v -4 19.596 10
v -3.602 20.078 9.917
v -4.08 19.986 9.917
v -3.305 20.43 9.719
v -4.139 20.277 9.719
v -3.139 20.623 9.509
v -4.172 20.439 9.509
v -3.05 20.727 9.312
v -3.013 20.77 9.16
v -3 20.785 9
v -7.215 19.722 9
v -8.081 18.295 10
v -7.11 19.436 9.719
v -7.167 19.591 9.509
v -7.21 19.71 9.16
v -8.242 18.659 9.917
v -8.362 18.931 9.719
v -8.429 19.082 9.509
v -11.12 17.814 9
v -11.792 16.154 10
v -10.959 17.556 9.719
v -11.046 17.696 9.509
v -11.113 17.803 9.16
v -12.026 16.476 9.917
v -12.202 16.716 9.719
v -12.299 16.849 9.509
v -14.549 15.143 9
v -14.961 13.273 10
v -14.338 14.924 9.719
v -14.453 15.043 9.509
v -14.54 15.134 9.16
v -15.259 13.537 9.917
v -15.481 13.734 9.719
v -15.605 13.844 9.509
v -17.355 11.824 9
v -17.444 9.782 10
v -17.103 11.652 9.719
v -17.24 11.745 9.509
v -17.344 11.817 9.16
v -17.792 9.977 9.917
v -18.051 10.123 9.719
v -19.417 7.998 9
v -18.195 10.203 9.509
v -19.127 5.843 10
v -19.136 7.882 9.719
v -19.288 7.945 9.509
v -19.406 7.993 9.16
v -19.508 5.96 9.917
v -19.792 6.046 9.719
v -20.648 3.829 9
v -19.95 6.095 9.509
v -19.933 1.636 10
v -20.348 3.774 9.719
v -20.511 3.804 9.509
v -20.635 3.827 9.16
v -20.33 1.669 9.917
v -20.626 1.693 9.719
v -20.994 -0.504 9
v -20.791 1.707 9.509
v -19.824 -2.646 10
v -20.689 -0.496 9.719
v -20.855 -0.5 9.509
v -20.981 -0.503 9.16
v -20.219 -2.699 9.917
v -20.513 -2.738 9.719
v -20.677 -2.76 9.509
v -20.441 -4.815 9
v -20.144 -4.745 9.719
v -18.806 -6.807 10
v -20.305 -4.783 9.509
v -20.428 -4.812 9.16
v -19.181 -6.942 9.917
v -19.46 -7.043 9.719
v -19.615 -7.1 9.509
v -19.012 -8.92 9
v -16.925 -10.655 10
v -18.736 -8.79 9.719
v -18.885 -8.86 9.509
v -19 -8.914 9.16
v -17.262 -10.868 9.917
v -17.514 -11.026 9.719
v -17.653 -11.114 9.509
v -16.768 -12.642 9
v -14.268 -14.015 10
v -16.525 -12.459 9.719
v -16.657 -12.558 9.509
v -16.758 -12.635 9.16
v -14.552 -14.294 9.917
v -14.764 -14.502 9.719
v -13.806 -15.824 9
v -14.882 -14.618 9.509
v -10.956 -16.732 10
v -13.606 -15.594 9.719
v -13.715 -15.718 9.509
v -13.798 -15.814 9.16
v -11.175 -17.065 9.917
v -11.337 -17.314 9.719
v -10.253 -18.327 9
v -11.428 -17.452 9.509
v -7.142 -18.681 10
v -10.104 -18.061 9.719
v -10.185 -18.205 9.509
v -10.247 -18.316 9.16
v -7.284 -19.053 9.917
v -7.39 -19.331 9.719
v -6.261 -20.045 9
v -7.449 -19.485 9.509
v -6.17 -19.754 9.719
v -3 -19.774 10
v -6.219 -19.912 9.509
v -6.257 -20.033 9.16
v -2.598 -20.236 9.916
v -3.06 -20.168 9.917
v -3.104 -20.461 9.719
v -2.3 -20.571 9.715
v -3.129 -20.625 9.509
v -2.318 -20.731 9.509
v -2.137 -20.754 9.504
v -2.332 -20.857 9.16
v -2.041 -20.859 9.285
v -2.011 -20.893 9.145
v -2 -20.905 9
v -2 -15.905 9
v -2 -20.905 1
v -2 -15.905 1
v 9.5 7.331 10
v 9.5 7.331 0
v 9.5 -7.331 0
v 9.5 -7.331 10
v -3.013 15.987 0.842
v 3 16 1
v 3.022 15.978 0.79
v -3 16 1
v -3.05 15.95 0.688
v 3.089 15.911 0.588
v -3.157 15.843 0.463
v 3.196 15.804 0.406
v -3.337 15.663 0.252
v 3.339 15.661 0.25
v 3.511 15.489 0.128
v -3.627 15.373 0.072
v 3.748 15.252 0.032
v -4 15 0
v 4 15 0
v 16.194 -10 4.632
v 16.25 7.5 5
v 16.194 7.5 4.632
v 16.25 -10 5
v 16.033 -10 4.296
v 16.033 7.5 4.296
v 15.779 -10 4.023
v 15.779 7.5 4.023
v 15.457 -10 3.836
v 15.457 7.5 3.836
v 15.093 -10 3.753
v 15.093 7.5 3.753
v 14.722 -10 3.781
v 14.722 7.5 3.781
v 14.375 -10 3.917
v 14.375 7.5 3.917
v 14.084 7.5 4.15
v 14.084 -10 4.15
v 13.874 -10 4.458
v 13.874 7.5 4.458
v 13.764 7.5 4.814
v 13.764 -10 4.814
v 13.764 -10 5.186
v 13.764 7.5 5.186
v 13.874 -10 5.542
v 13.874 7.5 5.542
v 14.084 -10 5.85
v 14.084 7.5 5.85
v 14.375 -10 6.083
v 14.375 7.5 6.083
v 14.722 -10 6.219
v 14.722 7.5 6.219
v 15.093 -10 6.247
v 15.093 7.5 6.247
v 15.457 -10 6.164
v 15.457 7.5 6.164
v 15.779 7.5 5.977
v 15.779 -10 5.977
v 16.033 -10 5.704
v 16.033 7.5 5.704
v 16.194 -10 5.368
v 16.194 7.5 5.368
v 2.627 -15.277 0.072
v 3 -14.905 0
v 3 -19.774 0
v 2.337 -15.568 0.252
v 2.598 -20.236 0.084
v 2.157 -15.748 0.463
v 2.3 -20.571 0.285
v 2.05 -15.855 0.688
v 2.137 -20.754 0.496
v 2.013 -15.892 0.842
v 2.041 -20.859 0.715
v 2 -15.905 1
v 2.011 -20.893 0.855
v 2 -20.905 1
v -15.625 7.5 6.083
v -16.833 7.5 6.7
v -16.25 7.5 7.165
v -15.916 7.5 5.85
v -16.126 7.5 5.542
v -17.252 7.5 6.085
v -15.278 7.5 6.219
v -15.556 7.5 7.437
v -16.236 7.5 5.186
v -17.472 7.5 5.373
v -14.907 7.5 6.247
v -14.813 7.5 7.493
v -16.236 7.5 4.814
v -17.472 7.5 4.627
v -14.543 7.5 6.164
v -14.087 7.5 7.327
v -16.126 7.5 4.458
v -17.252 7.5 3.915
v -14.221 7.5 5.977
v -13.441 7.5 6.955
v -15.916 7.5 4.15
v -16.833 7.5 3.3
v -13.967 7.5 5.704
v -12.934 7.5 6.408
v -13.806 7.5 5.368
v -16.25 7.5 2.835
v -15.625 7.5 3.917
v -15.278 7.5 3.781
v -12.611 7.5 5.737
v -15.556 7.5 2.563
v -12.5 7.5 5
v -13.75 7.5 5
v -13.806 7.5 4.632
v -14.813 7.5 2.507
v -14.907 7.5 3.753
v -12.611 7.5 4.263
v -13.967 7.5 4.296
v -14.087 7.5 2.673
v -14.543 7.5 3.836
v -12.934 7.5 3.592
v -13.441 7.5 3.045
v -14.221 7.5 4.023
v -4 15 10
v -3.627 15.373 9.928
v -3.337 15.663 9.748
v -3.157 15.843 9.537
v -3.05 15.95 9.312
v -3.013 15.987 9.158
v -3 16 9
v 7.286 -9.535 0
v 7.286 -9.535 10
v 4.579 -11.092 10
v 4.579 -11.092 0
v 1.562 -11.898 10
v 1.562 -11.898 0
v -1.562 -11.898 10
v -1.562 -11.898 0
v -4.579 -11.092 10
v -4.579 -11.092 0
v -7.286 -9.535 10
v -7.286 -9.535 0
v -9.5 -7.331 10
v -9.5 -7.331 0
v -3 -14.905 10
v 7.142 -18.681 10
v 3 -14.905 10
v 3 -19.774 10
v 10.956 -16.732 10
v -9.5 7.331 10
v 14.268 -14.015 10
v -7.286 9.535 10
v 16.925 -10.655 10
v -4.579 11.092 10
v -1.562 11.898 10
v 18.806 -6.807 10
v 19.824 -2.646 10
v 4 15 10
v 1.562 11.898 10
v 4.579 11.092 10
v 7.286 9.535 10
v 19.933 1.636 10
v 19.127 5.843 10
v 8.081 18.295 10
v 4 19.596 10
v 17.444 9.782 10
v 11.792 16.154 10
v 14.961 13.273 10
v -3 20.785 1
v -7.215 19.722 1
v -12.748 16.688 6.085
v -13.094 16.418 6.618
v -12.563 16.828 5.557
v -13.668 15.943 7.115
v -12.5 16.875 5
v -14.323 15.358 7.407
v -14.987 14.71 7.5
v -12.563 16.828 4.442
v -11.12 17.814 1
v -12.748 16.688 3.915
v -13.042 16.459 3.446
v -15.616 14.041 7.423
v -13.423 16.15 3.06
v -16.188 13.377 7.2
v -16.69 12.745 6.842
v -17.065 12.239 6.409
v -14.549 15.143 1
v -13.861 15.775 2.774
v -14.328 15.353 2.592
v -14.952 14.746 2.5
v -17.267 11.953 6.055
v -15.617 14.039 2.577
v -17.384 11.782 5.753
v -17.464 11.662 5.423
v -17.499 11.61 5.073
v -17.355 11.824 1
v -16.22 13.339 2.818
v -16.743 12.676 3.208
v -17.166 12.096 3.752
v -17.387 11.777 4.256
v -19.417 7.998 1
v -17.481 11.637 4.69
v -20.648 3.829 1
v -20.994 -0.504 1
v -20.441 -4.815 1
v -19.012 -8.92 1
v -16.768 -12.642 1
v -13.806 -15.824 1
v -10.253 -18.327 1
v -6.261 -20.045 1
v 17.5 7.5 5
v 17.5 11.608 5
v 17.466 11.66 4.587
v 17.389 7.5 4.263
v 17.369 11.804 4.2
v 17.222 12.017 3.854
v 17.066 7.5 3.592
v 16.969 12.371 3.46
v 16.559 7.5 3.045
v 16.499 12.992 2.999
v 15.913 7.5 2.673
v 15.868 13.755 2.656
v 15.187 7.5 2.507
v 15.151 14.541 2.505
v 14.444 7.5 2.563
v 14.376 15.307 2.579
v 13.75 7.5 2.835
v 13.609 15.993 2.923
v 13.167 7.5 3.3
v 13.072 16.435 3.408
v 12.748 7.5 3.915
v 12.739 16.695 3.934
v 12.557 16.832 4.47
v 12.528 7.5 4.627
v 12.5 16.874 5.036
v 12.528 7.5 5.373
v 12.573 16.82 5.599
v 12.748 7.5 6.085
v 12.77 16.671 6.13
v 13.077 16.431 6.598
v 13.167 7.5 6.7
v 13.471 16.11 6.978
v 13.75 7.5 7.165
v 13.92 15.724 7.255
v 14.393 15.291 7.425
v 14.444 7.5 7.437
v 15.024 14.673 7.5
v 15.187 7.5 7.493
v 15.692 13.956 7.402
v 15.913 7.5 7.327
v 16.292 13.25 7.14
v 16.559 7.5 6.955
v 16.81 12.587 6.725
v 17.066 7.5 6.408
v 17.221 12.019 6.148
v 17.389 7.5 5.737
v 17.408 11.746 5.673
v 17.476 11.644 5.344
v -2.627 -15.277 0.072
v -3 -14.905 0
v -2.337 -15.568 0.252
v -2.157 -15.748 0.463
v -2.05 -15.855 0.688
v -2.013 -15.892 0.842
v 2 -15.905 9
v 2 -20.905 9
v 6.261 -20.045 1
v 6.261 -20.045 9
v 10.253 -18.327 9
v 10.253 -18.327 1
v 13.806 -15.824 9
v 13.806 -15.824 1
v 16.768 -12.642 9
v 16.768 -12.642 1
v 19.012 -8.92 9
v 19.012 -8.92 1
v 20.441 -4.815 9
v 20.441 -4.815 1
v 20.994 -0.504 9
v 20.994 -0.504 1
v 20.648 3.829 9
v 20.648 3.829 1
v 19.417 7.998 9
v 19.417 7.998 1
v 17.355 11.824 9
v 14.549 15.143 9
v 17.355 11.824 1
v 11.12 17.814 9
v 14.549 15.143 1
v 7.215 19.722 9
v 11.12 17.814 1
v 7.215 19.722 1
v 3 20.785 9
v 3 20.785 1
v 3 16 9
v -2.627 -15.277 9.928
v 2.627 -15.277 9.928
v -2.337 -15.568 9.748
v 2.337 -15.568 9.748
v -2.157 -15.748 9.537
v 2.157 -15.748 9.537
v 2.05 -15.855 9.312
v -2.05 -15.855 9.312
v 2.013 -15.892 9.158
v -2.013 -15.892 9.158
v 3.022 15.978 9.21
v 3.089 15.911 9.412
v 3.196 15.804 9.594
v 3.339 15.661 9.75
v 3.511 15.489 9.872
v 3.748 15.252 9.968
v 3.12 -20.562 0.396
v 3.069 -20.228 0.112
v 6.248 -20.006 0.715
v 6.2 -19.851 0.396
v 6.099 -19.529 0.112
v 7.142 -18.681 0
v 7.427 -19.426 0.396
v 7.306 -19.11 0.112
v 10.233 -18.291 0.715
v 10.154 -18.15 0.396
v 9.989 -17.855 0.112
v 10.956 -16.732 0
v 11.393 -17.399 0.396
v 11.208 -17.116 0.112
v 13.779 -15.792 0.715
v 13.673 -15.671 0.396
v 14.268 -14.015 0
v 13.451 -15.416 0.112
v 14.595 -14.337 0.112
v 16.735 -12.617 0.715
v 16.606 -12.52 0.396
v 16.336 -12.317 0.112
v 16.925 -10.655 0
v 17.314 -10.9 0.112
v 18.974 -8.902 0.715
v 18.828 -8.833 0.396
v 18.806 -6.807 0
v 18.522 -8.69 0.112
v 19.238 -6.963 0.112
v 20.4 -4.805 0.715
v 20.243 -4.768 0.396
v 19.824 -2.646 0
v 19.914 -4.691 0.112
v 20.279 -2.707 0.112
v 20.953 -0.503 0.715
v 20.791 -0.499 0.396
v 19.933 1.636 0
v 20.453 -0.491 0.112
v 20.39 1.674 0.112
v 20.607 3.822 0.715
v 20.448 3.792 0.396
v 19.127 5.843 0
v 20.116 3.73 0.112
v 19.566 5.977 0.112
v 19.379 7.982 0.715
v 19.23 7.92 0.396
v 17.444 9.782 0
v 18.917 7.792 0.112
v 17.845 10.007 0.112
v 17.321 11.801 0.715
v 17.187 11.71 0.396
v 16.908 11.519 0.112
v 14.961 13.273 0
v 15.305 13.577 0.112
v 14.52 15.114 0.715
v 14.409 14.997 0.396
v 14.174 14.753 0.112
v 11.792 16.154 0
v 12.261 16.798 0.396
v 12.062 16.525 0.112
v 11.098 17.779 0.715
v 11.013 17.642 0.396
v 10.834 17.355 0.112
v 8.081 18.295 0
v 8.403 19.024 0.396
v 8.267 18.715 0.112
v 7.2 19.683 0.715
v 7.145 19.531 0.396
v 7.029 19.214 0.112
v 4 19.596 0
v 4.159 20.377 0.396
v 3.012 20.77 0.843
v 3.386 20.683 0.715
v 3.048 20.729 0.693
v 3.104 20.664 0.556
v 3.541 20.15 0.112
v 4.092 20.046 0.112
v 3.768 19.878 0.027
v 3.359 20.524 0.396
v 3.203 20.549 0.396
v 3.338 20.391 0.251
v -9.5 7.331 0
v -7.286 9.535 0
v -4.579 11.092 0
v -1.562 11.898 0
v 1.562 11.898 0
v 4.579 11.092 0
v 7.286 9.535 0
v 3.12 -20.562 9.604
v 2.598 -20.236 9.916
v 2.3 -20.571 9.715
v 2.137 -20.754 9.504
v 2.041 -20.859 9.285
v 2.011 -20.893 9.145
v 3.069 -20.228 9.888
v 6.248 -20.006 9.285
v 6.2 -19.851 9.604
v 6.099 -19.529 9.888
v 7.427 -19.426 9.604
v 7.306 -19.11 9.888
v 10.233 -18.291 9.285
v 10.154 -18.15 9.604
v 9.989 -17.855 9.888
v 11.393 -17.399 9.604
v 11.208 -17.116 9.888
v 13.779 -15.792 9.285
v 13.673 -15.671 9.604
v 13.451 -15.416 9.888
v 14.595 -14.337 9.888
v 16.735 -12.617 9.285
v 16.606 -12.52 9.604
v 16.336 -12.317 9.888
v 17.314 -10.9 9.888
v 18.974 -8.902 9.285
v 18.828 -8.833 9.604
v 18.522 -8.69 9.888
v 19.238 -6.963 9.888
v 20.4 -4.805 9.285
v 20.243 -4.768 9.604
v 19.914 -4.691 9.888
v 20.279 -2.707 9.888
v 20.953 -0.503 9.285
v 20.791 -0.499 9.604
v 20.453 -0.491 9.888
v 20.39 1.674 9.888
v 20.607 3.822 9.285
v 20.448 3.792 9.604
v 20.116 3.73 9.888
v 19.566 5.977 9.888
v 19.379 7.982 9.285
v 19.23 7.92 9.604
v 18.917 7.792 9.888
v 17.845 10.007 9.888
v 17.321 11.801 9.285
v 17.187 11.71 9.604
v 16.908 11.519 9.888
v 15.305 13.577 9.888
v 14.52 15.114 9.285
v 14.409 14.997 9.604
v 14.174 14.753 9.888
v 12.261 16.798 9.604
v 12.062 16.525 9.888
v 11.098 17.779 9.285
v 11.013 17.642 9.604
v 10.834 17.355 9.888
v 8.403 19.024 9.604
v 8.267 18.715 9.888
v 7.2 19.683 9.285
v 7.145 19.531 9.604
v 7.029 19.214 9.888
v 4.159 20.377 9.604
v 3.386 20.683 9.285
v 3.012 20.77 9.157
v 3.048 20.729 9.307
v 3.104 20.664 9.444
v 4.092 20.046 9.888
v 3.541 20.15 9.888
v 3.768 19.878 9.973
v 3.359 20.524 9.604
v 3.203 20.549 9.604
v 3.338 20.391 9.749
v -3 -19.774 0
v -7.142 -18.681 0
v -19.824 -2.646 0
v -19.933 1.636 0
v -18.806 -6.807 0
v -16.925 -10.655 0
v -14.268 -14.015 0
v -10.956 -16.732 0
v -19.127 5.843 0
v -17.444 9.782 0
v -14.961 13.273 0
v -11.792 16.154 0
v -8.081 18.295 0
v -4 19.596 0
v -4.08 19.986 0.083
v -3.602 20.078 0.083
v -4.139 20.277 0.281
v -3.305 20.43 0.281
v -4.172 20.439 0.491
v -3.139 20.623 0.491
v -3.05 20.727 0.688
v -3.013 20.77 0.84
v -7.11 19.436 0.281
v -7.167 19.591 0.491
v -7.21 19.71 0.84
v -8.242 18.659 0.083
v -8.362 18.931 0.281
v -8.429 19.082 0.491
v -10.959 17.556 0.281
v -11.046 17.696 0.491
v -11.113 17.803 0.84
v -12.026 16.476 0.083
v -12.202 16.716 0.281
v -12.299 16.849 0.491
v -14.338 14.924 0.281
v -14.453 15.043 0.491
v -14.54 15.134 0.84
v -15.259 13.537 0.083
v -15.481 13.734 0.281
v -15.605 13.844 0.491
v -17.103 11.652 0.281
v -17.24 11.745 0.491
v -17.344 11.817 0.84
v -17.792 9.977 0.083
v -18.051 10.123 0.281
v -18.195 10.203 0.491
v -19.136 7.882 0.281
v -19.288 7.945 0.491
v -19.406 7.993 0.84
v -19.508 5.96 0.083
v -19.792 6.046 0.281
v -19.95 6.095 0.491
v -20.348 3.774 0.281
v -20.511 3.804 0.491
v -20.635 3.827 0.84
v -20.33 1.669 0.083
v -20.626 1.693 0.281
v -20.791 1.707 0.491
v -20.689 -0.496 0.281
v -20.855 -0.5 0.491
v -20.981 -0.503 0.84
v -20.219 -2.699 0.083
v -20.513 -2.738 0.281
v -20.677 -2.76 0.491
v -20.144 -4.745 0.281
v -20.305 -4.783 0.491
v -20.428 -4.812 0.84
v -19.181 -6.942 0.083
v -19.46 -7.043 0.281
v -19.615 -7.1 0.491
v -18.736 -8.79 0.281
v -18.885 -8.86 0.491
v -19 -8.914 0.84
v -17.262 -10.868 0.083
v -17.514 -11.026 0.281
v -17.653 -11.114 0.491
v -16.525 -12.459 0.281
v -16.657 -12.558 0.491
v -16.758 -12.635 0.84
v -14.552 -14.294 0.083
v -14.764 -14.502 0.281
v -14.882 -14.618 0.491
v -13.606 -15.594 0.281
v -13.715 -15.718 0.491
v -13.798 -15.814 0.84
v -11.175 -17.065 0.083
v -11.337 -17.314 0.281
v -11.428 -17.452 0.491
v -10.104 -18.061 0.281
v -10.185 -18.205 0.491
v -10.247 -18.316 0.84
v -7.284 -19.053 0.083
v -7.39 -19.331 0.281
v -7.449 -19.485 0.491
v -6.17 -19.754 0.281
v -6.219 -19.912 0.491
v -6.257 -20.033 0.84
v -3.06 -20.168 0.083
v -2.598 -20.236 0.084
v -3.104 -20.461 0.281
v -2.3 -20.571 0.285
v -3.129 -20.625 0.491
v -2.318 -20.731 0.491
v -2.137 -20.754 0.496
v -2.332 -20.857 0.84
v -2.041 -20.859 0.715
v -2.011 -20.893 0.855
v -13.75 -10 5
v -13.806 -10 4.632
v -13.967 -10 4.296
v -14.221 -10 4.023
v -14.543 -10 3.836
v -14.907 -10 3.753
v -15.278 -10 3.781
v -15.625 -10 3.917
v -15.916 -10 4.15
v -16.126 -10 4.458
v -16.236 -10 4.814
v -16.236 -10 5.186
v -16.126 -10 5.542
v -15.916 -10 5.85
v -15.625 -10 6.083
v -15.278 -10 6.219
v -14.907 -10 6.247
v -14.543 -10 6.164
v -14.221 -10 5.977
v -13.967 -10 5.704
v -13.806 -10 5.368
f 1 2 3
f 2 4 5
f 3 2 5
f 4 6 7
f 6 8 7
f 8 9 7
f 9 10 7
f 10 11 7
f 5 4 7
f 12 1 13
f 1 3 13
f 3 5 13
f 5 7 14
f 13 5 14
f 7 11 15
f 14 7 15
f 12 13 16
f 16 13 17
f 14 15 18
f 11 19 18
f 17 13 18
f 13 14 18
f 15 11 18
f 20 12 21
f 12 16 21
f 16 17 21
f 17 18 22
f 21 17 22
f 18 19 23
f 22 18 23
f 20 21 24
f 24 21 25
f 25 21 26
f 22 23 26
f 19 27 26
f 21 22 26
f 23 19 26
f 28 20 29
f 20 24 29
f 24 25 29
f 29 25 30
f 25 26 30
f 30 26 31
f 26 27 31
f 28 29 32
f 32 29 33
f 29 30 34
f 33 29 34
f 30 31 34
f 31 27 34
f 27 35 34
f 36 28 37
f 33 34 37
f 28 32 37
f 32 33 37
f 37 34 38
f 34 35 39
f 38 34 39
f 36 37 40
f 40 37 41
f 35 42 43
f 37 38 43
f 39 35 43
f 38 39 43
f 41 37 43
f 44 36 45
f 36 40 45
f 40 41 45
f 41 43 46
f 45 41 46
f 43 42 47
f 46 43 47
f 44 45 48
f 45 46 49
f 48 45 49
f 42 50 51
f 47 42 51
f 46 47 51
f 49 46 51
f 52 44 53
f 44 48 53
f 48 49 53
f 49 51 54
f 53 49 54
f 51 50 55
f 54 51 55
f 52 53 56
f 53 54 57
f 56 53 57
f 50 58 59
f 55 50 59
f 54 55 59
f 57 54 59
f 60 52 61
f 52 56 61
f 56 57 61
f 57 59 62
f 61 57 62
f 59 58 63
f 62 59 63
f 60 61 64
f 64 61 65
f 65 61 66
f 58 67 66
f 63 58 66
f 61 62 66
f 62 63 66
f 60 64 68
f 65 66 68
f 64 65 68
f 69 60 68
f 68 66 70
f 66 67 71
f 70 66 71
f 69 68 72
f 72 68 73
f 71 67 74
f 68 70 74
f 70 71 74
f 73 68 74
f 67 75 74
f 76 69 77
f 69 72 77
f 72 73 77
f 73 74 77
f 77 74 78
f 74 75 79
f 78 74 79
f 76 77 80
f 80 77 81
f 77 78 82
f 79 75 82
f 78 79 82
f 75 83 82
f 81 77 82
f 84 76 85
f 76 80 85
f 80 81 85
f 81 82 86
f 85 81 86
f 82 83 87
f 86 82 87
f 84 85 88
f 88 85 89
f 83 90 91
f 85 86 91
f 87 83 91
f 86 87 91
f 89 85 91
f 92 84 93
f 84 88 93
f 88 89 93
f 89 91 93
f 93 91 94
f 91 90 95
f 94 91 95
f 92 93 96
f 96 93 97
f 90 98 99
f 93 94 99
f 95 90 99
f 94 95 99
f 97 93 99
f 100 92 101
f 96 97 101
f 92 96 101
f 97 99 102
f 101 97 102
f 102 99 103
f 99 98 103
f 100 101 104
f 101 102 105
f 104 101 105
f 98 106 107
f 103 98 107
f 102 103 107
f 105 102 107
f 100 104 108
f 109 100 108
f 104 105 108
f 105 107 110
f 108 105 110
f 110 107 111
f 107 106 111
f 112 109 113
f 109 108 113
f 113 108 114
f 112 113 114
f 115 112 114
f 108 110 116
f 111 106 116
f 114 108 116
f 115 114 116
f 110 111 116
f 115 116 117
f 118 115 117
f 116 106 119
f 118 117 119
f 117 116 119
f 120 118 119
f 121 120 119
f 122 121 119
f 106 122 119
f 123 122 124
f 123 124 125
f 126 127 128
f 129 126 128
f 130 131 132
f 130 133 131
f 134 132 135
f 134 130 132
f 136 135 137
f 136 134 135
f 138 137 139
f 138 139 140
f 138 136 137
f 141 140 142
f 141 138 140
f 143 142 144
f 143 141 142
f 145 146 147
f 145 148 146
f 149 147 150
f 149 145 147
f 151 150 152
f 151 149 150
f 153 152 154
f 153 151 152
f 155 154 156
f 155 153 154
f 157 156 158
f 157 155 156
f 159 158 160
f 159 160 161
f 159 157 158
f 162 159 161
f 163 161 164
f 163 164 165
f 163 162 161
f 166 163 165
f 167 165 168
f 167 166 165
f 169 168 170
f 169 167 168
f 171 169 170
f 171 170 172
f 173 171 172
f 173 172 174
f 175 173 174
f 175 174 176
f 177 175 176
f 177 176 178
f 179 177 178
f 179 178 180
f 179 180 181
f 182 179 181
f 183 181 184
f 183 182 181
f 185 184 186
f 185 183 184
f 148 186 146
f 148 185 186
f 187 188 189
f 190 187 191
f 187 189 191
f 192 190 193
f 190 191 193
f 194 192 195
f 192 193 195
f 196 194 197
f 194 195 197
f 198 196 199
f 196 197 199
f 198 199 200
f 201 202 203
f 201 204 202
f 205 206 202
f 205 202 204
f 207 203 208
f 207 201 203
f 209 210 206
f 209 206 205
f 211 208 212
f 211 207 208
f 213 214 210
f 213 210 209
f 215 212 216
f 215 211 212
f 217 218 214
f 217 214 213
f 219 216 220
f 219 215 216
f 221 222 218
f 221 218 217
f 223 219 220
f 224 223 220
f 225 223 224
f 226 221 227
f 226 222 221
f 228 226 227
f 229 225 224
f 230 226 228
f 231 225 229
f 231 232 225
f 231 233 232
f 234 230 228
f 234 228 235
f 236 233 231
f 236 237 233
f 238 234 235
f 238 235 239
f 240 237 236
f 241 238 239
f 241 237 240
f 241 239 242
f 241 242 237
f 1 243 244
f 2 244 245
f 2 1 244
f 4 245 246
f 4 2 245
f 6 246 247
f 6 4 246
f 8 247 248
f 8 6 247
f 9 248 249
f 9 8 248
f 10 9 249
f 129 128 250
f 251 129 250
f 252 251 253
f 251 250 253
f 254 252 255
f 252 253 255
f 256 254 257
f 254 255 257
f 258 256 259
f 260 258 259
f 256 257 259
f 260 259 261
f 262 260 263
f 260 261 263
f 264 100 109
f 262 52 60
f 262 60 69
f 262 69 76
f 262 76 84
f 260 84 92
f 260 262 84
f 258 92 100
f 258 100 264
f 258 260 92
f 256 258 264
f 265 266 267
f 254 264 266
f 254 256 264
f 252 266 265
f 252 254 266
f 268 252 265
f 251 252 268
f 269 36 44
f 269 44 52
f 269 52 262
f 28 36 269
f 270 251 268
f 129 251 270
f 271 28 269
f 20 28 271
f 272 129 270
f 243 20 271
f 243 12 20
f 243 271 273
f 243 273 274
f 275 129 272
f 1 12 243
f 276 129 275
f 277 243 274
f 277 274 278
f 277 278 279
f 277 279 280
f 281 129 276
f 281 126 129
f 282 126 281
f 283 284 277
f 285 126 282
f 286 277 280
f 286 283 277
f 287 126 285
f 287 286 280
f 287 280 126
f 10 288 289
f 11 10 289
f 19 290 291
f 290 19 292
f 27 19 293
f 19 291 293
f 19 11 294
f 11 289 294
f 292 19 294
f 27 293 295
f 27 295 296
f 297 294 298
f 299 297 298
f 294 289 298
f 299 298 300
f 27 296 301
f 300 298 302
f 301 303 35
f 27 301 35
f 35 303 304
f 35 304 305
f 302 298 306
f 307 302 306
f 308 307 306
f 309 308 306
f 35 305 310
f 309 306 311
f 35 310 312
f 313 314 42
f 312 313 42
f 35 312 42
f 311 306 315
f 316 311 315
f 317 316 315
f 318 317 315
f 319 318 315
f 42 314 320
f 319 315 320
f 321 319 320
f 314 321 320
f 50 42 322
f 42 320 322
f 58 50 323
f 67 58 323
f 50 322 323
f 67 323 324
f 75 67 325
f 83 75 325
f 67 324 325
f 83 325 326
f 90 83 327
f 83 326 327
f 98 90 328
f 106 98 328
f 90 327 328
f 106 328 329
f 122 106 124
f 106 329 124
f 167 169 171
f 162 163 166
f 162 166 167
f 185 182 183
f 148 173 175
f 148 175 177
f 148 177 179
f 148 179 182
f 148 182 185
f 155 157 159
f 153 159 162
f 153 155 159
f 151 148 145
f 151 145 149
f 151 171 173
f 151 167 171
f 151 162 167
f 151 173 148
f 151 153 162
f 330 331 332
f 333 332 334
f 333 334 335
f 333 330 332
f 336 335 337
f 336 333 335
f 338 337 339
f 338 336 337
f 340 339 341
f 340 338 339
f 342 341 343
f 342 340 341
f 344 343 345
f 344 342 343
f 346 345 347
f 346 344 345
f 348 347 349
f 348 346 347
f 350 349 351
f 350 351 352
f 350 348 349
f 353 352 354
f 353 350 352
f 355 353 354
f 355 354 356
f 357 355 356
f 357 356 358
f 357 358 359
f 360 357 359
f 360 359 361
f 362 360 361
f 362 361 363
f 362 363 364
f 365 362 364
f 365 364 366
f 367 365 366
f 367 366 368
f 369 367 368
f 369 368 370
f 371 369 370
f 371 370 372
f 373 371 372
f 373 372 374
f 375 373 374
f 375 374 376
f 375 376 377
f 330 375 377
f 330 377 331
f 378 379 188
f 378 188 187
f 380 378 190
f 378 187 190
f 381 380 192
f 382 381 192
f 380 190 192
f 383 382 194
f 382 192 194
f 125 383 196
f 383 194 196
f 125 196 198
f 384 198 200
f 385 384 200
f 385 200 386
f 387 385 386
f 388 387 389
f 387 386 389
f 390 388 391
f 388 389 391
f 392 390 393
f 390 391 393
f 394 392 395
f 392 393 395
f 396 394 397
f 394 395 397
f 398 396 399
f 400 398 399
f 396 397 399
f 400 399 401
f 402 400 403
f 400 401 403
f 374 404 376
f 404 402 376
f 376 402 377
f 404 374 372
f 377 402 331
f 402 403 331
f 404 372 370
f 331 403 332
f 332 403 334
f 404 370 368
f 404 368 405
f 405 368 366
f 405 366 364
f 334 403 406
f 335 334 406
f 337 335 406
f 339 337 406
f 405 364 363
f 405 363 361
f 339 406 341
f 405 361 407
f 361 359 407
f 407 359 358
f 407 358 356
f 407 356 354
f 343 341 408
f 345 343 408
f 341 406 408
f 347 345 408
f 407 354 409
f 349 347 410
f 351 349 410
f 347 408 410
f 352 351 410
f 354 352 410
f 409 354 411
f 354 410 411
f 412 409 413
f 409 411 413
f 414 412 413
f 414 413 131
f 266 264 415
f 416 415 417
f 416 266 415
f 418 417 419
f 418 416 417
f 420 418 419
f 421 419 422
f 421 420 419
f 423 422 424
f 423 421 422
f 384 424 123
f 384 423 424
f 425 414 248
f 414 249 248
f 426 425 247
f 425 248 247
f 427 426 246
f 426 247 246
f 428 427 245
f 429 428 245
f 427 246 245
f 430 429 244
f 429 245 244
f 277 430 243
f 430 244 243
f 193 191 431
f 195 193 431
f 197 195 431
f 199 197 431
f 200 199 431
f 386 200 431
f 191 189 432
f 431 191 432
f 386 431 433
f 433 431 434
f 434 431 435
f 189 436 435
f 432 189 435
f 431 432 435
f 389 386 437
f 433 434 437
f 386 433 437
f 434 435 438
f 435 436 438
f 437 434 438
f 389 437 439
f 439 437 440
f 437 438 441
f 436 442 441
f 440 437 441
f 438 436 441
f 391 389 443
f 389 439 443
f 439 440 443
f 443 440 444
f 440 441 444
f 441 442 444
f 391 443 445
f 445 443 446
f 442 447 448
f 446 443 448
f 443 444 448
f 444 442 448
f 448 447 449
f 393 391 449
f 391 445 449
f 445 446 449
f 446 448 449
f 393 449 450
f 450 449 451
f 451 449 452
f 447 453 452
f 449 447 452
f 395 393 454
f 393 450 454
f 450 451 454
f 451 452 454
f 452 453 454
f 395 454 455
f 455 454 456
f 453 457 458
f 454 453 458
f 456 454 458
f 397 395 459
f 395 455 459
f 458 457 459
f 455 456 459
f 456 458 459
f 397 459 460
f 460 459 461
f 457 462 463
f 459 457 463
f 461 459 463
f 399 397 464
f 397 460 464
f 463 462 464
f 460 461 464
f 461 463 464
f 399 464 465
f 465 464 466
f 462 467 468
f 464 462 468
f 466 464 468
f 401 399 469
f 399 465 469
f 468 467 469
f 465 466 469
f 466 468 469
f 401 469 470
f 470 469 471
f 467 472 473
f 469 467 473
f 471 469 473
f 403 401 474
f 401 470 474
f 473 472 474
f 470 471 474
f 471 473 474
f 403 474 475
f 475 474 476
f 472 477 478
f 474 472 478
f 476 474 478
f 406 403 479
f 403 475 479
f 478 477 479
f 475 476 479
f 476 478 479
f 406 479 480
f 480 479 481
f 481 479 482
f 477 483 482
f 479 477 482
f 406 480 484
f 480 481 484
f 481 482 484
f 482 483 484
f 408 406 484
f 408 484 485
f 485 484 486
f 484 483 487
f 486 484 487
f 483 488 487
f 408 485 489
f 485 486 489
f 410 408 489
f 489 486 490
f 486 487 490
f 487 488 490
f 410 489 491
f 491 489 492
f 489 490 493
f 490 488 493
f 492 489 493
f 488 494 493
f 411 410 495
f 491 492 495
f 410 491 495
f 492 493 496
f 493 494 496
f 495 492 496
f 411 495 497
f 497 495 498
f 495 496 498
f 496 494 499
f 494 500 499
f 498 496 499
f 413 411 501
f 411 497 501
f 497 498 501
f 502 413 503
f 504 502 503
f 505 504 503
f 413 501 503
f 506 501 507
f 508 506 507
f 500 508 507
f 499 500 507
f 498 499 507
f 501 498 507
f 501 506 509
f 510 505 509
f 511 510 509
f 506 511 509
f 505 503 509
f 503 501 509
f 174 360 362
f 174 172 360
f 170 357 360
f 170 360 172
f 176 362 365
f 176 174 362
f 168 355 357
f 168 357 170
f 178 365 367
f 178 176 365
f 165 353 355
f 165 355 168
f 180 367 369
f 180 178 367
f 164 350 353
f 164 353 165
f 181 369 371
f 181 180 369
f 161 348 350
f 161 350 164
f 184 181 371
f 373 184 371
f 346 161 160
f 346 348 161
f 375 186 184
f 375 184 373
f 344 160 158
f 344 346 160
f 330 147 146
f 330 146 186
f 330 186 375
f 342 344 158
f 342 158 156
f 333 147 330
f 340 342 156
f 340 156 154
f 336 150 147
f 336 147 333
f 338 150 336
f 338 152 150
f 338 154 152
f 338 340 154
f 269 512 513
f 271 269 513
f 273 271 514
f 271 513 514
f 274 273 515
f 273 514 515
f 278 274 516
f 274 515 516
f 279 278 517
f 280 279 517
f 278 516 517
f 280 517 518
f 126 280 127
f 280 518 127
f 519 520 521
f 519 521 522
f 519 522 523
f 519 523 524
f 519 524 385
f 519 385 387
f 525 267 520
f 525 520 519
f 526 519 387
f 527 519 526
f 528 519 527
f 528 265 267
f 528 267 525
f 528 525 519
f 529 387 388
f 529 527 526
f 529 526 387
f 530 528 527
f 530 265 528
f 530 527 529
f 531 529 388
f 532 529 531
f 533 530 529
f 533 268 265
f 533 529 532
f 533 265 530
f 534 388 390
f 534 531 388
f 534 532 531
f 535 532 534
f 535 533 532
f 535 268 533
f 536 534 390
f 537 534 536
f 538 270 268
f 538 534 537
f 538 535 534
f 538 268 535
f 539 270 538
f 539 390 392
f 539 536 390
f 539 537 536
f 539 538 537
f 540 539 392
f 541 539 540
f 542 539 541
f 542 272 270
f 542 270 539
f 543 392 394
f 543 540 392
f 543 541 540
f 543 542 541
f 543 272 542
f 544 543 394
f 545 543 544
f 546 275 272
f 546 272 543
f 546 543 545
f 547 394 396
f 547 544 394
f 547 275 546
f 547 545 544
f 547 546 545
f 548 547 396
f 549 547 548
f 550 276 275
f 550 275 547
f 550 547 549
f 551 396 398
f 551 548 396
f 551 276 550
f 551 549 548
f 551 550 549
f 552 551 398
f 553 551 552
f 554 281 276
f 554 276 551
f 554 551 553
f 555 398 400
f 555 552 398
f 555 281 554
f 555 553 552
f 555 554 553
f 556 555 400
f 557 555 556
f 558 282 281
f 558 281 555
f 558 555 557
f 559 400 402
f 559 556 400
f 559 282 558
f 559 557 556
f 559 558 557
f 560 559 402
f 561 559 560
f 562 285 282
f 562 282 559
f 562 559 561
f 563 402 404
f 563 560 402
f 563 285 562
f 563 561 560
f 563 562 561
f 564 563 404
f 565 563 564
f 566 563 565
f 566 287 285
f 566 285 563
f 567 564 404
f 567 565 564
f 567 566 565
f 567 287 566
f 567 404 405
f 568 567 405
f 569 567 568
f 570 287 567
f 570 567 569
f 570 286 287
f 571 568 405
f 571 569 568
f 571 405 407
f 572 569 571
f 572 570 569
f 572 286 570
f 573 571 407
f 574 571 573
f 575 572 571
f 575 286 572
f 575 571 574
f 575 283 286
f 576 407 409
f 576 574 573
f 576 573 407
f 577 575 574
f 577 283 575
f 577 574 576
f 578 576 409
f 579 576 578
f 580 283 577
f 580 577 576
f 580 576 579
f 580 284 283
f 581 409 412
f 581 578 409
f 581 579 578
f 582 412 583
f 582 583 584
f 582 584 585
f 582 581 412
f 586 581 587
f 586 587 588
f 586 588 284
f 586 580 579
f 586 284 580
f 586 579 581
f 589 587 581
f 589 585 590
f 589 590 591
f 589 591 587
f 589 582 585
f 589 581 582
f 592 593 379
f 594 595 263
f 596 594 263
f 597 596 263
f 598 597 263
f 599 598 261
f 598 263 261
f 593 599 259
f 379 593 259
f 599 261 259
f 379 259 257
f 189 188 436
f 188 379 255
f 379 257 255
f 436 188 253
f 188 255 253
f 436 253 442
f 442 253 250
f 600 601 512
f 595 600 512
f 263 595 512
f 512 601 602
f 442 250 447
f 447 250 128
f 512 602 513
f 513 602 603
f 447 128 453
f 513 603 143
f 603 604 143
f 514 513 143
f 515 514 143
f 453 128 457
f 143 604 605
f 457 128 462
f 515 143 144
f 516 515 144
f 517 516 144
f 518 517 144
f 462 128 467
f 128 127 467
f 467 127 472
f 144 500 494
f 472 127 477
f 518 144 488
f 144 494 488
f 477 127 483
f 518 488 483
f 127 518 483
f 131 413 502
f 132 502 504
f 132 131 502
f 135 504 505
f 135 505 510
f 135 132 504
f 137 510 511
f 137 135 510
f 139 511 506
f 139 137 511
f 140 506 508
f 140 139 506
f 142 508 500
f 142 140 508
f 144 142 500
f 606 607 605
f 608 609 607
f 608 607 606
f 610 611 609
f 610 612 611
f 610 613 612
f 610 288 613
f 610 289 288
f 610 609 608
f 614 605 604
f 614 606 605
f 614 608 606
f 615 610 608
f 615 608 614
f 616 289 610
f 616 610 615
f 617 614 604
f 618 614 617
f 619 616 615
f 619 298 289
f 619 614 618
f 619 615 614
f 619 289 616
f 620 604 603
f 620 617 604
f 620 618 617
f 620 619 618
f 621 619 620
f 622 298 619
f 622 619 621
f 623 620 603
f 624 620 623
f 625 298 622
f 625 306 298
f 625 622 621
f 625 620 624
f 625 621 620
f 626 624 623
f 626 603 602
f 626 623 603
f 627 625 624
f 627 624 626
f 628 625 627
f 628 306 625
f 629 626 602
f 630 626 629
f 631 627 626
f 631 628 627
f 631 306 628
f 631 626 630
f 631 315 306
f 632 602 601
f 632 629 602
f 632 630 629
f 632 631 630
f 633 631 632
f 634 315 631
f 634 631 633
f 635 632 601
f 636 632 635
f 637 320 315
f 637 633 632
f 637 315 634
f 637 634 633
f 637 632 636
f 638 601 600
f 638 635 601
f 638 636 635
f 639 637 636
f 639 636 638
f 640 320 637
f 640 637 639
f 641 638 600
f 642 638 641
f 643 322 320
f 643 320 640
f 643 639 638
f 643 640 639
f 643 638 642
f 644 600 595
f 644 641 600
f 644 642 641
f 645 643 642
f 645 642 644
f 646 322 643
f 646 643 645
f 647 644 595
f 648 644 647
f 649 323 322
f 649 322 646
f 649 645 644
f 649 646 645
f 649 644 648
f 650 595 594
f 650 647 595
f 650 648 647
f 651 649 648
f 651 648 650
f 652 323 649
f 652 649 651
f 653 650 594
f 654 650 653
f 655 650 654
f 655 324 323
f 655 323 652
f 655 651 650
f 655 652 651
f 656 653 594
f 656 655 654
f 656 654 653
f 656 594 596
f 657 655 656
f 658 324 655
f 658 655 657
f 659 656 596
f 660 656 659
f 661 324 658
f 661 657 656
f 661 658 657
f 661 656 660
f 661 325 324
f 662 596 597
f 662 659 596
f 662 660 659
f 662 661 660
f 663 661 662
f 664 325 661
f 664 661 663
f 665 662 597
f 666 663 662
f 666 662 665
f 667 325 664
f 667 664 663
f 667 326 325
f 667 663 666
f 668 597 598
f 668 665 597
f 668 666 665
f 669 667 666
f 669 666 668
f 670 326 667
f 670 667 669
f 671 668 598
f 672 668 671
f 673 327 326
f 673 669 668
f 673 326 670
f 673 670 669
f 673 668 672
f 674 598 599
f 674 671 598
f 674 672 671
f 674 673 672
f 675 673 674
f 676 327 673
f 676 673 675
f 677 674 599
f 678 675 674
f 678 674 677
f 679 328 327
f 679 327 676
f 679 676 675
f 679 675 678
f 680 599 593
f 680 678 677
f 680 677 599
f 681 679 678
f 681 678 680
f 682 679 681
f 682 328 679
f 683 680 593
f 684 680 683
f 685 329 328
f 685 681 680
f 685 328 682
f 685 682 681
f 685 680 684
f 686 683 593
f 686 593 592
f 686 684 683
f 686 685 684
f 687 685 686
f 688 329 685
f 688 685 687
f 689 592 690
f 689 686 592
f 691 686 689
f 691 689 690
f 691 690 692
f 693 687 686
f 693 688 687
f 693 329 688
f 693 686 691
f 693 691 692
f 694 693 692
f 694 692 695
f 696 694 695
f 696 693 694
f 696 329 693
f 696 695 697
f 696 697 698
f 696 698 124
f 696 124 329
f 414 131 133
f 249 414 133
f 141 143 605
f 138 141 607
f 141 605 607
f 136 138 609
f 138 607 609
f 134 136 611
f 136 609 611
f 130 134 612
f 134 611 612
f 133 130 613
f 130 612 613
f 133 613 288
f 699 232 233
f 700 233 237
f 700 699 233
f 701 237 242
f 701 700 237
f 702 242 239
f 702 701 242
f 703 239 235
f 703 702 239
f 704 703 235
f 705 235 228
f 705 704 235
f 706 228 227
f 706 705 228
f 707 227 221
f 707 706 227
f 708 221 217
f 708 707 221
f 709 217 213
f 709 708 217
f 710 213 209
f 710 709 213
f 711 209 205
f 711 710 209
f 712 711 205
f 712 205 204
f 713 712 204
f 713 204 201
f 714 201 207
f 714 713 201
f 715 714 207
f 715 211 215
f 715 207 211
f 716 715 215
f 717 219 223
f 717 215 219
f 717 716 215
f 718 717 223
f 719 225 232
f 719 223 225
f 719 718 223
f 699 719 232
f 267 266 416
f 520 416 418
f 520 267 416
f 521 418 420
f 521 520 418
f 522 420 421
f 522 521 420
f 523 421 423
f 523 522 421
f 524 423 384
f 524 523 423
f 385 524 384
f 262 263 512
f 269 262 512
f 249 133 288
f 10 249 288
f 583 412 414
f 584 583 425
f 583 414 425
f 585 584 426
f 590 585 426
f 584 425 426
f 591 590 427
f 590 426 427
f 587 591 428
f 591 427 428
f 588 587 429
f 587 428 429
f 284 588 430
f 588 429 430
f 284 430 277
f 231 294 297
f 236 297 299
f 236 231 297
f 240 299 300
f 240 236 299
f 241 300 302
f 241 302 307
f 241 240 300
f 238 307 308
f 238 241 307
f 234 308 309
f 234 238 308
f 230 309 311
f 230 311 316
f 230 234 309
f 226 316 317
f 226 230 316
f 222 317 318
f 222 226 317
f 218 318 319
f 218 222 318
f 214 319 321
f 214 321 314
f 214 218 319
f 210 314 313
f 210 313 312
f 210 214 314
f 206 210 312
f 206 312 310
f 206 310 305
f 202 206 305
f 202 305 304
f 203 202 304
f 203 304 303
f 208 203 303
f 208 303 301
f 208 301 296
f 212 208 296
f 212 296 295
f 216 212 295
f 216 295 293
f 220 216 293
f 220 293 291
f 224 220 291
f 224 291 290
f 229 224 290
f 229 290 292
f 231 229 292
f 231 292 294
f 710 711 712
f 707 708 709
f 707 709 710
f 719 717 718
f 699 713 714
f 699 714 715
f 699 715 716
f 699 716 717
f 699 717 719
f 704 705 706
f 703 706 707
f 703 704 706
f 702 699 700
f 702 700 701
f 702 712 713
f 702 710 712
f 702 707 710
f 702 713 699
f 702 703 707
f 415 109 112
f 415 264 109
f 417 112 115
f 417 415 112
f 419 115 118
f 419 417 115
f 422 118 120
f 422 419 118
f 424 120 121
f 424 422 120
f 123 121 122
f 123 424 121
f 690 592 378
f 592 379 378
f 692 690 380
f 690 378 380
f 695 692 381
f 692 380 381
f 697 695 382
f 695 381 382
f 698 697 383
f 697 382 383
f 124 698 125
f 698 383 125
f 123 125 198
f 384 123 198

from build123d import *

# Parameters (mm, degrees)
BOSS_EXTRU_1_DEPTH           = 10
ENL_V_MAT_EXTRU_1_DEPTH      = 20
ENL_V_MAT_EXTRU_1_DEPTH_BACK = 10
ESQUISSE2_R                  = 1.25
ENL_V_START                  = 7.5
ESQUISSE2_5_R                = 2.5
ESQUISSE2_5_R_2              = 1.25
ENL_V_MAT_EXTRU_2_DEPTH      = 10
CONG_1_R                     = 1


with BuildPart() as part:
    # Esquisse1 → Boss.-Extru.1 (new body)
    with BuildSketch(Plane.XY):
        with BuildLine():
            Line((3, 20.784609691), (3, 16))
            Line((3, 16), (-3, 16))
            Line((-3, 16), (-3, 20.784609691))
            ThreePointArc((-3, 20.784609691), (-20.993961129, -0.503583277), (-2, -20.90454496))
            Line((-2, -20.90454496), (-2, -15.90454496))
            Line((-2, -15.90454496), (2, -15.90454496))
            Line((2, -15.90454496), (2, -20.90454496))
            ThreePointArc((2, -20.90454496), (20.993961129, -0.503583277), (3, 20.784609691))
        make_face()
        with BuildLine():
            ThreePointArc((-9.5, 7.331439149), (0, 12), (9.5, 7.331439149))
            Line((9.5, 7.331439149), (9.5, -7.331439149))
            ThreePointArc((9.5, -7.331439149), (0, -12), (-9.5, -7.331439149))
            Line((-9.5, -7.331439149), (-9.5, 7.331439149))
        make_face(mode=Mode.SUBTRACT)
    extrude(amount=BOSS_EXTRU_1_DEPTH)

    # Esquisse2 → Enl_v. mat.-Extru.1 (cut, two sides: drawn at the far end of the back side and taken through both)
    with BuildSketch(Plane(origin=(0, 0, 0), x_dir=(1, 0, 0), z_dir=(0, 1, 0)).offset(-ENL_V_MAT_EXTRU_1_DEPTH_BACK)):
        with Locations((15, -5)):
            Circle(ESQUISSE2_R)
        with Locations((-15, -5)):
            Circle(ESQUISSE2_R)
    extrude(amount=ENL_V_MAT_EXTRU_1_DEPTH + ENL_V_MAT_EXTRU_1_DEPTH_BACK, mode=Mode.SUBTRACT)

    # Esquisse2_5 → Enl_v. mat.-Extru.2 (cut)
    # profile 1 of 2: a face of its own
    with BuildSketch(Plane(origin=(0, 0, 0), x_dir=(1, 0, 0), z_dir=(0, 1, 0)).offset(ENL_V_START)):
        with Locations((15, -5)):
            Circle(ESQUISSE2_5_R)
        with Locations((15, -5)):
            Circle(ESQUISSE2_5_R_2, mode=Mode.SUBTRACT)
    # profile 2 of 2: a face of its own
    with BuildSketch(Plane(origin=(0, 0, 0), x_dir=(1, 0, 0), z_dir=(0, 1, 0)).offset(ENL_V_START)):
        with Locations((-15, -5)):
            Circle(ESQUISSE2_5_R)
        with Locations((-15, -5)):
            Circle(ESQUISSE2_5_R_2, mode=Mode.SUBTRACT)
    extrude(amount=ENL_V_MAT_EXTRU_2_DEPTH, mode=Mode.SUBTRACT)

    # Cong_1
    cong_1_edges = [part.edges().sort_by_distance(p)[0] for p in [
        (-2, -18.40454496, 0),
        (0, -15.90454496, 0),
        (2, -18.40454496, 0),
        (-20.993961129, -0.503583277, 0),
        (-3, 18.392304845, 0),
        (0, 16, 0),
        (3, 18.392304845, 0),
        (20.993961129, -0.503583277, 0),
        (-2, -18.40454496, 10),
        (0, -15.90454496, 10),
        (2, -18.40454496, 10),
        (-3, 18.392304845, 10),
        (0, 16, 10),
        (3, 18.392304845, 10),
        (20.993961129, -0.503583277, 10),
        (-20.993961129, -0.503583277, 10),
    ]]
    fillet(cong_1_edges, radius=CONG_1_R)


solid = part.part
